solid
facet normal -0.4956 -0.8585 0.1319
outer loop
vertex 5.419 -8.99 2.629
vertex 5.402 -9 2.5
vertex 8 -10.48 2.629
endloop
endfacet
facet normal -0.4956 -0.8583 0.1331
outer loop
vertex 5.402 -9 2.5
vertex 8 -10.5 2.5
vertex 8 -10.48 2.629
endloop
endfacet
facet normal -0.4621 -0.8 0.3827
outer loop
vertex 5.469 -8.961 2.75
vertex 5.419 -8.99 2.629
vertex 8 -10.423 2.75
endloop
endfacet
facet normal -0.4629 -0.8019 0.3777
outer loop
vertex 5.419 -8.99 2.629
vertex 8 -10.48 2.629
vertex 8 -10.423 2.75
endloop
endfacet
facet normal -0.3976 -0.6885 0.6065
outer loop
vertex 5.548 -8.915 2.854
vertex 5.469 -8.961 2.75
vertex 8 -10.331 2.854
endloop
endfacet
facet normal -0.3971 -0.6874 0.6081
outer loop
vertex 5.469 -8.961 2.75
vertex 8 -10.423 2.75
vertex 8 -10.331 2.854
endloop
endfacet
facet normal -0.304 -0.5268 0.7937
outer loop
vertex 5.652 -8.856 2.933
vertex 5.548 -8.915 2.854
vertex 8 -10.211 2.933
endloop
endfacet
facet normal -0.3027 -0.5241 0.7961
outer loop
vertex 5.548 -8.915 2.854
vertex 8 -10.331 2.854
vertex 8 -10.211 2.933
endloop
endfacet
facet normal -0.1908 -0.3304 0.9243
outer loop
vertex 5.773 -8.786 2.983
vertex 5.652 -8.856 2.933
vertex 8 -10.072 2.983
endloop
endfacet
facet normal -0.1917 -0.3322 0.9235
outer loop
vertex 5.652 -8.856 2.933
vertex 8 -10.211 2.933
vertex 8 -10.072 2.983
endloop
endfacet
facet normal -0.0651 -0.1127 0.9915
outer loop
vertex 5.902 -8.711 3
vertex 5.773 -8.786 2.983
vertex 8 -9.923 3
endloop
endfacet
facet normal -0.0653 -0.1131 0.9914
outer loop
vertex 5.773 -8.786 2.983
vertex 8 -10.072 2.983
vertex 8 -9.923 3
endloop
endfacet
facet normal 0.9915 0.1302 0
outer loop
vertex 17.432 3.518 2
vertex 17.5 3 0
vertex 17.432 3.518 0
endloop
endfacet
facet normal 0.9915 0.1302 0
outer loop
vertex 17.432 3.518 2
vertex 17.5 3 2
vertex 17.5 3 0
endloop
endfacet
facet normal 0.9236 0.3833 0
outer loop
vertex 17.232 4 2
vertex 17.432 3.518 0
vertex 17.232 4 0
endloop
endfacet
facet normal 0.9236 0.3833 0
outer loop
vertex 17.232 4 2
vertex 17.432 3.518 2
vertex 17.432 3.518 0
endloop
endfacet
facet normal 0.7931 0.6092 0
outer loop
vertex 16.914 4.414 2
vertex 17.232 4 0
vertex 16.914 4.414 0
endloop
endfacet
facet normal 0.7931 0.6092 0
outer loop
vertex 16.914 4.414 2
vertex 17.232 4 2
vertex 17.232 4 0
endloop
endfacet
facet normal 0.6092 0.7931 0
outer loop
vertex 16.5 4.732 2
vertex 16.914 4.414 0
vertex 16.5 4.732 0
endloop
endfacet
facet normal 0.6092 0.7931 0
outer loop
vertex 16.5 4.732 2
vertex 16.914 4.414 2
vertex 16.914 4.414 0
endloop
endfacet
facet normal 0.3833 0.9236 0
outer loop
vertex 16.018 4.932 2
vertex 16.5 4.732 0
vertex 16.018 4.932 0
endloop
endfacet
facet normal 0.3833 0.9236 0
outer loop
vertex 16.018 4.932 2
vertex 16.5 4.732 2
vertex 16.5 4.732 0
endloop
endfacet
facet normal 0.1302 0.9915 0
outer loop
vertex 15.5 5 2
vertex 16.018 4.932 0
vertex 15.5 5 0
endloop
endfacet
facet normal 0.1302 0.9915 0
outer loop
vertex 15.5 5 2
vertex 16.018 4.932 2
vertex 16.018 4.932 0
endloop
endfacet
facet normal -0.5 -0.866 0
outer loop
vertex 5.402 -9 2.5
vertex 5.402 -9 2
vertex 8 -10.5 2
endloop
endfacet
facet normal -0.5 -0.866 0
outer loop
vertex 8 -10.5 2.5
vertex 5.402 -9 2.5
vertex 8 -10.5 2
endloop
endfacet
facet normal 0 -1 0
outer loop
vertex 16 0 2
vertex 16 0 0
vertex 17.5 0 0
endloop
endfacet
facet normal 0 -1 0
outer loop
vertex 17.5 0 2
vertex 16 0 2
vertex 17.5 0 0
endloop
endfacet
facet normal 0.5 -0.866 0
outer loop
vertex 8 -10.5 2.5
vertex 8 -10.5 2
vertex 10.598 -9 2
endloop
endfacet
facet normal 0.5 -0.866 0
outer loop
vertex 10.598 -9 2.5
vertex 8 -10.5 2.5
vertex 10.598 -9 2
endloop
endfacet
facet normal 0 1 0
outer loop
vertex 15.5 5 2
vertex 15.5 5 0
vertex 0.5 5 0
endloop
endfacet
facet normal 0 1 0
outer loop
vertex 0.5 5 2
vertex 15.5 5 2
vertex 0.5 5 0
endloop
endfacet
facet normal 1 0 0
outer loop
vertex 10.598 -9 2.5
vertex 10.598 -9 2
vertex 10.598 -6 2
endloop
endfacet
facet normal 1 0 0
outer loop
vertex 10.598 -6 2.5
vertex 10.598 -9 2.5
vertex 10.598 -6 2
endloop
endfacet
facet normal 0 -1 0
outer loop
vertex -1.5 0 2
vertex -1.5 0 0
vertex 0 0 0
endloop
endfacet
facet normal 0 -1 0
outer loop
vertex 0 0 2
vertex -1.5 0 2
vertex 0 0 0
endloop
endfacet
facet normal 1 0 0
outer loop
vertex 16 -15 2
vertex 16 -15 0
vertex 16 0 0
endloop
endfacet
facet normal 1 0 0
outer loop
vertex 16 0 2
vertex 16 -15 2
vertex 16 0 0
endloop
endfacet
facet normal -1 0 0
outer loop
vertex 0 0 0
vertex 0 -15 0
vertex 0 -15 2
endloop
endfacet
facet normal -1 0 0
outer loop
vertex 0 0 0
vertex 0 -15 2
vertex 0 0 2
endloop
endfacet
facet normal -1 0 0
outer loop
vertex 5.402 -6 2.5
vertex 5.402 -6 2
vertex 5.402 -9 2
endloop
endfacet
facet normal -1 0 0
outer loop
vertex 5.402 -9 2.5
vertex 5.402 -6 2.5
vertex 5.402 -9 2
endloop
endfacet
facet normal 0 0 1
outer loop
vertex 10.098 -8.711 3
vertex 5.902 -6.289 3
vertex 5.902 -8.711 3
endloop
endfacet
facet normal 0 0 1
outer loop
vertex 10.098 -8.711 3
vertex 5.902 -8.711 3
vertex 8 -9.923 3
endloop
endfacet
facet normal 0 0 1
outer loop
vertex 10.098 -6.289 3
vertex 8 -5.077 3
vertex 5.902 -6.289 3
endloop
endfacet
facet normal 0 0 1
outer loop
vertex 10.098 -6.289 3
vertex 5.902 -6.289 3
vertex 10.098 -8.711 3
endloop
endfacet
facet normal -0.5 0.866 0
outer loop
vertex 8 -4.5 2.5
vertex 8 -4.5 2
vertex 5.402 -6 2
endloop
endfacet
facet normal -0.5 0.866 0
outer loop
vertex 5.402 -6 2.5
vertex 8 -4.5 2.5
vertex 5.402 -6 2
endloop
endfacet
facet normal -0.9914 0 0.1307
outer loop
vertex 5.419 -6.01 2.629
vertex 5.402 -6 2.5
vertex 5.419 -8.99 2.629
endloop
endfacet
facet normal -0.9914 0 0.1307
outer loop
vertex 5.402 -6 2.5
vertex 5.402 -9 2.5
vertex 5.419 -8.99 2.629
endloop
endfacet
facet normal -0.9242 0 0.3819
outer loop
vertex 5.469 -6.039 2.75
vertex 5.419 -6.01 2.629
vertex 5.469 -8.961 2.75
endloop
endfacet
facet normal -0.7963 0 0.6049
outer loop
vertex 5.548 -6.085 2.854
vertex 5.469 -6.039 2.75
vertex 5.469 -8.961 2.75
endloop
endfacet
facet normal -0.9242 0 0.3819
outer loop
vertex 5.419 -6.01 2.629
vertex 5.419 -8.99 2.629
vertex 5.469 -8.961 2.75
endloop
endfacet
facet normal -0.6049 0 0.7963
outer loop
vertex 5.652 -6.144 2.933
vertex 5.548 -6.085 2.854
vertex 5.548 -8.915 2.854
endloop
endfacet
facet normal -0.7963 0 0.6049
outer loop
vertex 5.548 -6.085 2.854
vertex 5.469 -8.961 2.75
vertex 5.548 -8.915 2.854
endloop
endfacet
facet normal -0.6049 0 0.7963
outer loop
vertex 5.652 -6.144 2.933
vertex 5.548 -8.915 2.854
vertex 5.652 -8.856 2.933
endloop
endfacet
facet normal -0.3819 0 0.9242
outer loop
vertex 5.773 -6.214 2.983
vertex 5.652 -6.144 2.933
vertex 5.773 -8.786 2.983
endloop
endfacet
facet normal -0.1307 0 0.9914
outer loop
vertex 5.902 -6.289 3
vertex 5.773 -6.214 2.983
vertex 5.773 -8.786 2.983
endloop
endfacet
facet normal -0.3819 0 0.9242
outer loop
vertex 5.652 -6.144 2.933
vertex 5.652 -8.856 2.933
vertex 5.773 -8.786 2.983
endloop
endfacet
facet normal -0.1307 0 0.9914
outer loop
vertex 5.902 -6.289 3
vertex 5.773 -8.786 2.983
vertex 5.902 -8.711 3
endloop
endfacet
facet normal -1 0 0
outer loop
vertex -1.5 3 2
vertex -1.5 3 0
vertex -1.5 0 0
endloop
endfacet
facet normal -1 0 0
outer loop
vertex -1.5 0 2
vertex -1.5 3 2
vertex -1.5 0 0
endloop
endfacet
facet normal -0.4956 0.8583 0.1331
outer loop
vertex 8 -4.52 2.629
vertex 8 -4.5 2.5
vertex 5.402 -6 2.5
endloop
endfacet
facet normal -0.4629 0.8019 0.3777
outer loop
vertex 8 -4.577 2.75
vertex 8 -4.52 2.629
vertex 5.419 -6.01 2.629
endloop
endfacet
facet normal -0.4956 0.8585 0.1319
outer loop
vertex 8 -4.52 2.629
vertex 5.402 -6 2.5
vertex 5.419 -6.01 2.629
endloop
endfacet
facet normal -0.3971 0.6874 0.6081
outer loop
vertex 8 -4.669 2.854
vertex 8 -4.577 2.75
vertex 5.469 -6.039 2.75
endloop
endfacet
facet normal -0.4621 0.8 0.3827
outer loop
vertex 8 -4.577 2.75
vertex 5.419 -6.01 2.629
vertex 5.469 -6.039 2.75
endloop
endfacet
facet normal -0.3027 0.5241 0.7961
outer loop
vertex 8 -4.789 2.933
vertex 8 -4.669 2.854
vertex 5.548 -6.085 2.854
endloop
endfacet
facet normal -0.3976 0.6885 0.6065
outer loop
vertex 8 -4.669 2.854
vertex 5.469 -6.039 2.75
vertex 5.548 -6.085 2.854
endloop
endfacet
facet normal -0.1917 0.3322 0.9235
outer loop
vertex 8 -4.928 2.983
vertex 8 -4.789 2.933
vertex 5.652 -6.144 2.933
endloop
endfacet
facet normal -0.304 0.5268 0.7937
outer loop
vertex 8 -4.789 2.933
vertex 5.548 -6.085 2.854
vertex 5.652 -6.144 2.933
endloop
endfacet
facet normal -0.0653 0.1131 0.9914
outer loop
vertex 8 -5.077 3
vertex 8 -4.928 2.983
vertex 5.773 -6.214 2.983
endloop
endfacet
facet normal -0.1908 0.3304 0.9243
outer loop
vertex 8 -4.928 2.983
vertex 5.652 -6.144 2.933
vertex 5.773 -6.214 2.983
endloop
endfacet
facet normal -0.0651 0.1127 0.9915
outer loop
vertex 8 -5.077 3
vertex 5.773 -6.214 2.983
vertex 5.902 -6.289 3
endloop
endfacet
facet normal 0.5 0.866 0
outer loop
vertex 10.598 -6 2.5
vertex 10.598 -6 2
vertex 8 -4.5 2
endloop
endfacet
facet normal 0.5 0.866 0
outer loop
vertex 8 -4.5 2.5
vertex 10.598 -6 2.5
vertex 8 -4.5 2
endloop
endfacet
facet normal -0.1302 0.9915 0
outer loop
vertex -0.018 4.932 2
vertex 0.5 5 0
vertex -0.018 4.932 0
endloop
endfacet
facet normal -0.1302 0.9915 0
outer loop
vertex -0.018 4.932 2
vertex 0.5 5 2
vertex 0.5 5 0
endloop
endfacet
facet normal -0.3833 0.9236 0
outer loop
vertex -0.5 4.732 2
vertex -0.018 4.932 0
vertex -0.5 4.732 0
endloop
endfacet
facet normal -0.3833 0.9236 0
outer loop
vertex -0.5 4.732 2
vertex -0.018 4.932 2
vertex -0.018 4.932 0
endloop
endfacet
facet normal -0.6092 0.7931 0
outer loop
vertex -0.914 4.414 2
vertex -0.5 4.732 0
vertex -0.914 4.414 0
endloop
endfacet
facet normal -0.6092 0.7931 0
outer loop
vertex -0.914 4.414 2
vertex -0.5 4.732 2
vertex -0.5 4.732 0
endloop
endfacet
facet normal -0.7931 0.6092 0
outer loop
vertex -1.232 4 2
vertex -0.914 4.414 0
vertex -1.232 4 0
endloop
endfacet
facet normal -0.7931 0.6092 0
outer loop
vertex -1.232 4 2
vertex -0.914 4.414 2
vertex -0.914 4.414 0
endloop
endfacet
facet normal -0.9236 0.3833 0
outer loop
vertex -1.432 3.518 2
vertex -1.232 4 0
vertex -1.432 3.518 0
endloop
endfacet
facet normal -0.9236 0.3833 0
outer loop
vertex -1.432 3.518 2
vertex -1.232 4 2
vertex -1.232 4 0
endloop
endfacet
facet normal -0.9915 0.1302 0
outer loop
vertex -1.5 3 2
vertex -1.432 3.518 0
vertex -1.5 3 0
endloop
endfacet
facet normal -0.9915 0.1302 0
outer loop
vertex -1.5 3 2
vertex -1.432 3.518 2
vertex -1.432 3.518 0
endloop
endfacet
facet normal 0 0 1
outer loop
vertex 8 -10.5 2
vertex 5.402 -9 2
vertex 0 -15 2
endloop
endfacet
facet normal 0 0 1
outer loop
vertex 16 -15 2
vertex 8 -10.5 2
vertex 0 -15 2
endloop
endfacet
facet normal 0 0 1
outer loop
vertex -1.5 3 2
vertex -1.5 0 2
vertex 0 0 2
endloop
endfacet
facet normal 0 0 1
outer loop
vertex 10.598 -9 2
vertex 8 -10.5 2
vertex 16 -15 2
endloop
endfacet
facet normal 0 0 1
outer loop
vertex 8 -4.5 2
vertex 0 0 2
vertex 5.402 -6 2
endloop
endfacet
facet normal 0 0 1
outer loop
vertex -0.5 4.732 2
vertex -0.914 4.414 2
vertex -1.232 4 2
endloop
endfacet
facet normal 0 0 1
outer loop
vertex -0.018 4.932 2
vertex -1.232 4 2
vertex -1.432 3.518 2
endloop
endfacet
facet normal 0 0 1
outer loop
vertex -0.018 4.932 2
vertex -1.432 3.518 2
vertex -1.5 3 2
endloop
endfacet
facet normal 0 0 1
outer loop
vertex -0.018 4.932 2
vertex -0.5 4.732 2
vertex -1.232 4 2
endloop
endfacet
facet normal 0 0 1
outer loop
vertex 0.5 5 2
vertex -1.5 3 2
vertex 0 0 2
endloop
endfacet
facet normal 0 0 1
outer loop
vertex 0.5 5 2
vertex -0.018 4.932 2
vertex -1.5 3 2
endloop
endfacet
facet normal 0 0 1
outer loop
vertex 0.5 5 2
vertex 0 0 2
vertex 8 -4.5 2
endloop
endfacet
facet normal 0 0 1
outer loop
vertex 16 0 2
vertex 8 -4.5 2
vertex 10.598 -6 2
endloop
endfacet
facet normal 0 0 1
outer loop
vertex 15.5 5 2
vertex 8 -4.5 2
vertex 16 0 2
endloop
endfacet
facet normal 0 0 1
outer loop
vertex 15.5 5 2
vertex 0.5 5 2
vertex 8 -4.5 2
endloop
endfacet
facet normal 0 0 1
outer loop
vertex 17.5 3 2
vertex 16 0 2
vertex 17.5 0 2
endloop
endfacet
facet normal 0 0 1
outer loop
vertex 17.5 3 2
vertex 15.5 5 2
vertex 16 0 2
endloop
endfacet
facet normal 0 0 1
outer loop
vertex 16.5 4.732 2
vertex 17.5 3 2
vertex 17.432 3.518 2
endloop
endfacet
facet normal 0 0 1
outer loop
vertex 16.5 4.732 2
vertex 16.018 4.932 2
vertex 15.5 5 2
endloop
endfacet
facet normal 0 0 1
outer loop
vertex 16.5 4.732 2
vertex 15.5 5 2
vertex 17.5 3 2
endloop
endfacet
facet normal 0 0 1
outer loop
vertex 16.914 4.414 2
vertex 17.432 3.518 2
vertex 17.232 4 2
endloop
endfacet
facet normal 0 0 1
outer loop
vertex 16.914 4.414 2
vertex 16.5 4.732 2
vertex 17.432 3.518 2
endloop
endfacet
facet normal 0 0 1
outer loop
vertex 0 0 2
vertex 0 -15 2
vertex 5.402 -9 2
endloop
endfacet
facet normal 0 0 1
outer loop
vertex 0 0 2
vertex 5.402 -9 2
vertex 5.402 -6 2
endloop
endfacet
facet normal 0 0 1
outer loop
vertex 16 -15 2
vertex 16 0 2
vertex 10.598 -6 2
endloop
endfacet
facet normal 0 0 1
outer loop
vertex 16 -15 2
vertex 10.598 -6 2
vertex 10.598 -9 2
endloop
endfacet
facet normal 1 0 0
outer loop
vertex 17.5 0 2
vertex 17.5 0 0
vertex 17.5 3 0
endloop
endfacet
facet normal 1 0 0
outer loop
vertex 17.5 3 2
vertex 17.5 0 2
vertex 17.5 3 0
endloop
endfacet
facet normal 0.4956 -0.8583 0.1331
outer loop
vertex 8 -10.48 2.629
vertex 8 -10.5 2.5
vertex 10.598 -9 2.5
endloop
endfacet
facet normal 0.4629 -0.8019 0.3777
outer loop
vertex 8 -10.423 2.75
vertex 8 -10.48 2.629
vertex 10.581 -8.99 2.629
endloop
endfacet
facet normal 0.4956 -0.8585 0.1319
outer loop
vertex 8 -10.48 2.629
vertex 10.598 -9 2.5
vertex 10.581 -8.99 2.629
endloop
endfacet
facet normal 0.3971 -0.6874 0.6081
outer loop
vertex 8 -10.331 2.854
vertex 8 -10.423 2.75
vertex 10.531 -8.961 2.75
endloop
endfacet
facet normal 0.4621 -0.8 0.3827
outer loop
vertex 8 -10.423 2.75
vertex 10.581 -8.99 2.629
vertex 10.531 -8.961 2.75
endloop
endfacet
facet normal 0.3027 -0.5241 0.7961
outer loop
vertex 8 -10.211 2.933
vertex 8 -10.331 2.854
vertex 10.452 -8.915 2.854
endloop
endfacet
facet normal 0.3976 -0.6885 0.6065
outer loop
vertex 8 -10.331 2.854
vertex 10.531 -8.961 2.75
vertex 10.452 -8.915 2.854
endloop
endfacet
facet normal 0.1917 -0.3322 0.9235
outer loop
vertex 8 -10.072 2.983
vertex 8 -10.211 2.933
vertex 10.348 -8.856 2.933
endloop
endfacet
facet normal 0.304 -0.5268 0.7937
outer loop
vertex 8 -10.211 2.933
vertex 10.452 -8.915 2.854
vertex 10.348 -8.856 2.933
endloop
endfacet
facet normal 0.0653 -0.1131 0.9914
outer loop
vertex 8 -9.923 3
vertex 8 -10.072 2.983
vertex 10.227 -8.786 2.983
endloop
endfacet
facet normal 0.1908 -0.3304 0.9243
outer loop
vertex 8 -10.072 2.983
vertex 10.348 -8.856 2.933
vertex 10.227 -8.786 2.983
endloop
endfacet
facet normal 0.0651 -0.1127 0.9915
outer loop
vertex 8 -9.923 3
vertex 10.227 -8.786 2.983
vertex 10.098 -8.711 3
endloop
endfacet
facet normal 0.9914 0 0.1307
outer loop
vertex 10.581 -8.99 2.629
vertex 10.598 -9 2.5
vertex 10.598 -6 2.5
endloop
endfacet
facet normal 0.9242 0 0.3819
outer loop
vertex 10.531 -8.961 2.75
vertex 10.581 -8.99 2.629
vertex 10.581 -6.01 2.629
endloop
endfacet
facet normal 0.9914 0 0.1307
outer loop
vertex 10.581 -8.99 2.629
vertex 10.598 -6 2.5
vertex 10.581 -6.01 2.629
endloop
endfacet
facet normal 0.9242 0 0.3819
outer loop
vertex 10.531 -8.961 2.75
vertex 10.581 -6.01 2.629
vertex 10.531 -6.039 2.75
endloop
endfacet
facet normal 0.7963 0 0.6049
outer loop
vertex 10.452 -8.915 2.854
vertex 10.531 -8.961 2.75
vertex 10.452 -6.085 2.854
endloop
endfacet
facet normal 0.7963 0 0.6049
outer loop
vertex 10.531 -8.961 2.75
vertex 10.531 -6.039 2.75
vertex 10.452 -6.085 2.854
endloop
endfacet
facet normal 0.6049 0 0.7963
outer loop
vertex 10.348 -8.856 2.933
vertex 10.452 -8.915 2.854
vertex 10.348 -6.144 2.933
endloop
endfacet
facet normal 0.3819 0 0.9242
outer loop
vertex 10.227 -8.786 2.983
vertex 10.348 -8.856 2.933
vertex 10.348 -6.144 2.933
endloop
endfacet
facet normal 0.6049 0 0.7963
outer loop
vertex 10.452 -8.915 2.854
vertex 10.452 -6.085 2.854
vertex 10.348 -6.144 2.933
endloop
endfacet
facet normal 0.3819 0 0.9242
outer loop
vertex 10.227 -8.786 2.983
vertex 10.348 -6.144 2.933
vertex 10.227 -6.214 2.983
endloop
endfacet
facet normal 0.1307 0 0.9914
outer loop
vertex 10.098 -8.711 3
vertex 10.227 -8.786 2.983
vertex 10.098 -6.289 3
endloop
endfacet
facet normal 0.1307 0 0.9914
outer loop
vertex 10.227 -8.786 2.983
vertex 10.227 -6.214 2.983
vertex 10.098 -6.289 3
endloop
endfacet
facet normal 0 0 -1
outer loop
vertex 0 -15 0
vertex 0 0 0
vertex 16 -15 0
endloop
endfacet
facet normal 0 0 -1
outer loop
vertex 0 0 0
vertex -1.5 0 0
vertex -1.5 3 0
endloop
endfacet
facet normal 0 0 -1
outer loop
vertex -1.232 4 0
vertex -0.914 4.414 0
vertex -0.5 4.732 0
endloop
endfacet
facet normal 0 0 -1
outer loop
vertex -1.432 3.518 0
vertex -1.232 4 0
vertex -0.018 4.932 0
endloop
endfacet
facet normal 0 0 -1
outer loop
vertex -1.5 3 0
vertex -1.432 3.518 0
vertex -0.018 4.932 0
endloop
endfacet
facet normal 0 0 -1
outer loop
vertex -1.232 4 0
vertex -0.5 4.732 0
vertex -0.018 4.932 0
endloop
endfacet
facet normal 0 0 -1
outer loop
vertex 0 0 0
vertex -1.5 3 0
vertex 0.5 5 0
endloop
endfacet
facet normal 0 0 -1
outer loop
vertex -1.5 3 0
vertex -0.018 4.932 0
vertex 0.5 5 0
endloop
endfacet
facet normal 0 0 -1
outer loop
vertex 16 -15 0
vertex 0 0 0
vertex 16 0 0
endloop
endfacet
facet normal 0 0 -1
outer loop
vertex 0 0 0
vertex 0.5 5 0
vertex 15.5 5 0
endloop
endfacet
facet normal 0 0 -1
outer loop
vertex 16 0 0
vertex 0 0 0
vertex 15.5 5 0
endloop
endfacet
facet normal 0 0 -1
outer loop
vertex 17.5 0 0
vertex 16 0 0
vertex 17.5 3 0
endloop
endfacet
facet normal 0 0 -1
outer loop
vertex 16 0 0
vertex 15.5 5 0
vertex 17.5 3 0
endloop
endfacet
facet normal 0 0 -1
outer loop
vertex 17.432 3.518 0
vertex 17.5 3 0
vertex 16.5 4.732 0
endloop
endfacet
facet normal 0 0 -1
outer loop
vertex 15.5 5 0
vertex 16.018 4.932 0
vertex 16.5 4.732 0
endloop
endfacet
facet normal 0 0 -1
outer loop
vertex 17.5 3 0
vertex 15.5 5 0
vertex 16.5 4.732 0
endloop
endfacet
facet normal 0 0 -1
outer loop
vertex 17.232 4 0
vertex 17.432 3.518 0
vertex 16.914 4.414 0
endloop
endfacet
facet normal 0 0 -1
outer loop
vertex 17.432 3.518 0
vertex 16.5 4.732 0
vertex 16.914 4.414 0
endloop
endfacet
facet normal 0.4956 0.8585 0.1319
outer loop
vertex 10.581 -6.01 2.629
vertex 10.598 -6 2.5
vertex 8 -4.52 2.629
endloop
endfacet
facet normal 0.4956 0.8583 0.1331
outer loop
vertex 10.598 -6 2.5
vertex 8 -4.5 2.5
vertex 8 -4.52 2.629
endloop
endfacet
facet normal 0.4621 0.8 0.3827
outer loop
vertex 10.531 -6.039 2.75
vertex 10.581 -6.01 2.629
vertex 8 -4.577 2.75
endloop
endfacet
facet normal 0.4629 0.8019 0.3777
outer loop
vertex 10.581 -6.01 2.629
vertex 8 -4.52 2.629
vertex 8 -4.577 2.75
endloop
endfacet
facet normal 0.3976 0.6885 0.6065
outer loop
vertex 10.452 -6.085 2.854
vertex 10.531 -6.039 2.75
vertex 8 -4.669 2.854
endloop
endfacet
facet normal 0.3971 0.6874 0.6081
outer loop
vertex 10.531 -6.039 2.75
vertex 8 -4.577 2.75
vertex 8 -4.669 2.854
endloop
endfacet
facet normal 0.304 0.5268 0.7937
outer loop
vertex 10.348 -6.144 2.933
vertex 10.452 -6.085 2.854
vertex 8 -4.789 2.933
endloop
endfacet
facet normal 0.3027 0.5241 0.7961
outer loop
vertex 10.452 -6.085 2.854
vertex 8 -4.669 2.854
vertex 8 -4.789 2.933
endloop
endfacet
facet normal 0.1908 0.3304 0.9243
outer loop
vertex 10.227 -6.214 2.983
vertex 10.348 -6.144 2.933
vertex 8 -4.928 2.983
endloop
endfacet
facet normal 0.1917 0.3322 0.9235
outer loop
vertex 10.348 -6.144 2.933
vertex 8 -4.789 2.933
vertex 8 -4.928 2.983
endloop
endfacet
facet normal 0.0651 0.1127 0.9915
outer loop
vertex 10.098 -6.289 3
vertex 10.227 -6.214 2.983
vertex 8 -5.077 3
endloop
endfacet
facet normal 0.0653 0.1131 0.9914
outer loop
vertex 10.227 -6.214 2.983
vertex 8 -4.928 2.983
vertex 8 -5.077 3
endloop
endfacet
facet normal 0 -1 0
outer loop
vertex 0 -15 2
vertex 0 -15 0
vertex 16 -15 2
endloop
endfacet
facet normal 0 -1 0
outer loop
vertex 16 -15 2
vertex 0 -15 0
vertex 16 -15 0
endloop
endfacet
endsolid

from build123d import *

# Parameters (mm, degrees)
CROQUIS1_W              = 16
CROQUIS1_H              = 15
SALIENTE_EXTRUIR3_DEPTH = 2
REDONDEO1_R             = 2
SALIENTE_EXTRUIR4_DEPTH = 1
REDONDEO2_R             = 0.5


with BuildPart() as part:
    # Croquis1 → Saliente-Extruir3 (new body)
    with BuildSketch(Plane.XY):
        Polygon((-1.5, 0), (0, 0), (16, 0), (17.5, 0), (17.5, 5), (-1.5, 5), align=None)
        with Locations((8, -7.5)):
            Rectangle(CROQUIS1_W, CROQUIS1_H)
    extrude(amount=SALIENTE_EXTRUIR3_DEPTH)

    # Redondeo1
    redondeo1_edges = [part.edges().sort_by_distance(p)[0] for p in [
        (-1.5, 5, 1),
        (17.5, 5, 1),
    ]]
    fillet(redondeo1_edges, radius=REDONDEO1_R)

    # Croquis3 → Saliente-Extruir4 (add)
    with BuildSketch(Plane.XY.offset(2)):
        Polygon((8, -4.5), (5.401923789, -6), (5.401923789, -9), (8, -10.5), (10.598076211, -9), (10.598076211, -6), align=None)
    extrude(amount=SALIENTE_EXTRUIR4_DEPTH)

    # Redondeo2
    redondeo2_edges = [part.edges().sort_by_distance(p)[0] for p in [
        (9.299038106, -5.25, 3),
        (6.700961894, -5.25, 3),
        (5.401923789, -7.5, 3),
        (6.700961894, -9.75, 3),
        (9.299038106, -9.75, 3),
        (10.598076211, -7.5, 3),
    ]]
    fillet(redondeo2_edges, radius=REDONDEO2_R)


solid = part.part
